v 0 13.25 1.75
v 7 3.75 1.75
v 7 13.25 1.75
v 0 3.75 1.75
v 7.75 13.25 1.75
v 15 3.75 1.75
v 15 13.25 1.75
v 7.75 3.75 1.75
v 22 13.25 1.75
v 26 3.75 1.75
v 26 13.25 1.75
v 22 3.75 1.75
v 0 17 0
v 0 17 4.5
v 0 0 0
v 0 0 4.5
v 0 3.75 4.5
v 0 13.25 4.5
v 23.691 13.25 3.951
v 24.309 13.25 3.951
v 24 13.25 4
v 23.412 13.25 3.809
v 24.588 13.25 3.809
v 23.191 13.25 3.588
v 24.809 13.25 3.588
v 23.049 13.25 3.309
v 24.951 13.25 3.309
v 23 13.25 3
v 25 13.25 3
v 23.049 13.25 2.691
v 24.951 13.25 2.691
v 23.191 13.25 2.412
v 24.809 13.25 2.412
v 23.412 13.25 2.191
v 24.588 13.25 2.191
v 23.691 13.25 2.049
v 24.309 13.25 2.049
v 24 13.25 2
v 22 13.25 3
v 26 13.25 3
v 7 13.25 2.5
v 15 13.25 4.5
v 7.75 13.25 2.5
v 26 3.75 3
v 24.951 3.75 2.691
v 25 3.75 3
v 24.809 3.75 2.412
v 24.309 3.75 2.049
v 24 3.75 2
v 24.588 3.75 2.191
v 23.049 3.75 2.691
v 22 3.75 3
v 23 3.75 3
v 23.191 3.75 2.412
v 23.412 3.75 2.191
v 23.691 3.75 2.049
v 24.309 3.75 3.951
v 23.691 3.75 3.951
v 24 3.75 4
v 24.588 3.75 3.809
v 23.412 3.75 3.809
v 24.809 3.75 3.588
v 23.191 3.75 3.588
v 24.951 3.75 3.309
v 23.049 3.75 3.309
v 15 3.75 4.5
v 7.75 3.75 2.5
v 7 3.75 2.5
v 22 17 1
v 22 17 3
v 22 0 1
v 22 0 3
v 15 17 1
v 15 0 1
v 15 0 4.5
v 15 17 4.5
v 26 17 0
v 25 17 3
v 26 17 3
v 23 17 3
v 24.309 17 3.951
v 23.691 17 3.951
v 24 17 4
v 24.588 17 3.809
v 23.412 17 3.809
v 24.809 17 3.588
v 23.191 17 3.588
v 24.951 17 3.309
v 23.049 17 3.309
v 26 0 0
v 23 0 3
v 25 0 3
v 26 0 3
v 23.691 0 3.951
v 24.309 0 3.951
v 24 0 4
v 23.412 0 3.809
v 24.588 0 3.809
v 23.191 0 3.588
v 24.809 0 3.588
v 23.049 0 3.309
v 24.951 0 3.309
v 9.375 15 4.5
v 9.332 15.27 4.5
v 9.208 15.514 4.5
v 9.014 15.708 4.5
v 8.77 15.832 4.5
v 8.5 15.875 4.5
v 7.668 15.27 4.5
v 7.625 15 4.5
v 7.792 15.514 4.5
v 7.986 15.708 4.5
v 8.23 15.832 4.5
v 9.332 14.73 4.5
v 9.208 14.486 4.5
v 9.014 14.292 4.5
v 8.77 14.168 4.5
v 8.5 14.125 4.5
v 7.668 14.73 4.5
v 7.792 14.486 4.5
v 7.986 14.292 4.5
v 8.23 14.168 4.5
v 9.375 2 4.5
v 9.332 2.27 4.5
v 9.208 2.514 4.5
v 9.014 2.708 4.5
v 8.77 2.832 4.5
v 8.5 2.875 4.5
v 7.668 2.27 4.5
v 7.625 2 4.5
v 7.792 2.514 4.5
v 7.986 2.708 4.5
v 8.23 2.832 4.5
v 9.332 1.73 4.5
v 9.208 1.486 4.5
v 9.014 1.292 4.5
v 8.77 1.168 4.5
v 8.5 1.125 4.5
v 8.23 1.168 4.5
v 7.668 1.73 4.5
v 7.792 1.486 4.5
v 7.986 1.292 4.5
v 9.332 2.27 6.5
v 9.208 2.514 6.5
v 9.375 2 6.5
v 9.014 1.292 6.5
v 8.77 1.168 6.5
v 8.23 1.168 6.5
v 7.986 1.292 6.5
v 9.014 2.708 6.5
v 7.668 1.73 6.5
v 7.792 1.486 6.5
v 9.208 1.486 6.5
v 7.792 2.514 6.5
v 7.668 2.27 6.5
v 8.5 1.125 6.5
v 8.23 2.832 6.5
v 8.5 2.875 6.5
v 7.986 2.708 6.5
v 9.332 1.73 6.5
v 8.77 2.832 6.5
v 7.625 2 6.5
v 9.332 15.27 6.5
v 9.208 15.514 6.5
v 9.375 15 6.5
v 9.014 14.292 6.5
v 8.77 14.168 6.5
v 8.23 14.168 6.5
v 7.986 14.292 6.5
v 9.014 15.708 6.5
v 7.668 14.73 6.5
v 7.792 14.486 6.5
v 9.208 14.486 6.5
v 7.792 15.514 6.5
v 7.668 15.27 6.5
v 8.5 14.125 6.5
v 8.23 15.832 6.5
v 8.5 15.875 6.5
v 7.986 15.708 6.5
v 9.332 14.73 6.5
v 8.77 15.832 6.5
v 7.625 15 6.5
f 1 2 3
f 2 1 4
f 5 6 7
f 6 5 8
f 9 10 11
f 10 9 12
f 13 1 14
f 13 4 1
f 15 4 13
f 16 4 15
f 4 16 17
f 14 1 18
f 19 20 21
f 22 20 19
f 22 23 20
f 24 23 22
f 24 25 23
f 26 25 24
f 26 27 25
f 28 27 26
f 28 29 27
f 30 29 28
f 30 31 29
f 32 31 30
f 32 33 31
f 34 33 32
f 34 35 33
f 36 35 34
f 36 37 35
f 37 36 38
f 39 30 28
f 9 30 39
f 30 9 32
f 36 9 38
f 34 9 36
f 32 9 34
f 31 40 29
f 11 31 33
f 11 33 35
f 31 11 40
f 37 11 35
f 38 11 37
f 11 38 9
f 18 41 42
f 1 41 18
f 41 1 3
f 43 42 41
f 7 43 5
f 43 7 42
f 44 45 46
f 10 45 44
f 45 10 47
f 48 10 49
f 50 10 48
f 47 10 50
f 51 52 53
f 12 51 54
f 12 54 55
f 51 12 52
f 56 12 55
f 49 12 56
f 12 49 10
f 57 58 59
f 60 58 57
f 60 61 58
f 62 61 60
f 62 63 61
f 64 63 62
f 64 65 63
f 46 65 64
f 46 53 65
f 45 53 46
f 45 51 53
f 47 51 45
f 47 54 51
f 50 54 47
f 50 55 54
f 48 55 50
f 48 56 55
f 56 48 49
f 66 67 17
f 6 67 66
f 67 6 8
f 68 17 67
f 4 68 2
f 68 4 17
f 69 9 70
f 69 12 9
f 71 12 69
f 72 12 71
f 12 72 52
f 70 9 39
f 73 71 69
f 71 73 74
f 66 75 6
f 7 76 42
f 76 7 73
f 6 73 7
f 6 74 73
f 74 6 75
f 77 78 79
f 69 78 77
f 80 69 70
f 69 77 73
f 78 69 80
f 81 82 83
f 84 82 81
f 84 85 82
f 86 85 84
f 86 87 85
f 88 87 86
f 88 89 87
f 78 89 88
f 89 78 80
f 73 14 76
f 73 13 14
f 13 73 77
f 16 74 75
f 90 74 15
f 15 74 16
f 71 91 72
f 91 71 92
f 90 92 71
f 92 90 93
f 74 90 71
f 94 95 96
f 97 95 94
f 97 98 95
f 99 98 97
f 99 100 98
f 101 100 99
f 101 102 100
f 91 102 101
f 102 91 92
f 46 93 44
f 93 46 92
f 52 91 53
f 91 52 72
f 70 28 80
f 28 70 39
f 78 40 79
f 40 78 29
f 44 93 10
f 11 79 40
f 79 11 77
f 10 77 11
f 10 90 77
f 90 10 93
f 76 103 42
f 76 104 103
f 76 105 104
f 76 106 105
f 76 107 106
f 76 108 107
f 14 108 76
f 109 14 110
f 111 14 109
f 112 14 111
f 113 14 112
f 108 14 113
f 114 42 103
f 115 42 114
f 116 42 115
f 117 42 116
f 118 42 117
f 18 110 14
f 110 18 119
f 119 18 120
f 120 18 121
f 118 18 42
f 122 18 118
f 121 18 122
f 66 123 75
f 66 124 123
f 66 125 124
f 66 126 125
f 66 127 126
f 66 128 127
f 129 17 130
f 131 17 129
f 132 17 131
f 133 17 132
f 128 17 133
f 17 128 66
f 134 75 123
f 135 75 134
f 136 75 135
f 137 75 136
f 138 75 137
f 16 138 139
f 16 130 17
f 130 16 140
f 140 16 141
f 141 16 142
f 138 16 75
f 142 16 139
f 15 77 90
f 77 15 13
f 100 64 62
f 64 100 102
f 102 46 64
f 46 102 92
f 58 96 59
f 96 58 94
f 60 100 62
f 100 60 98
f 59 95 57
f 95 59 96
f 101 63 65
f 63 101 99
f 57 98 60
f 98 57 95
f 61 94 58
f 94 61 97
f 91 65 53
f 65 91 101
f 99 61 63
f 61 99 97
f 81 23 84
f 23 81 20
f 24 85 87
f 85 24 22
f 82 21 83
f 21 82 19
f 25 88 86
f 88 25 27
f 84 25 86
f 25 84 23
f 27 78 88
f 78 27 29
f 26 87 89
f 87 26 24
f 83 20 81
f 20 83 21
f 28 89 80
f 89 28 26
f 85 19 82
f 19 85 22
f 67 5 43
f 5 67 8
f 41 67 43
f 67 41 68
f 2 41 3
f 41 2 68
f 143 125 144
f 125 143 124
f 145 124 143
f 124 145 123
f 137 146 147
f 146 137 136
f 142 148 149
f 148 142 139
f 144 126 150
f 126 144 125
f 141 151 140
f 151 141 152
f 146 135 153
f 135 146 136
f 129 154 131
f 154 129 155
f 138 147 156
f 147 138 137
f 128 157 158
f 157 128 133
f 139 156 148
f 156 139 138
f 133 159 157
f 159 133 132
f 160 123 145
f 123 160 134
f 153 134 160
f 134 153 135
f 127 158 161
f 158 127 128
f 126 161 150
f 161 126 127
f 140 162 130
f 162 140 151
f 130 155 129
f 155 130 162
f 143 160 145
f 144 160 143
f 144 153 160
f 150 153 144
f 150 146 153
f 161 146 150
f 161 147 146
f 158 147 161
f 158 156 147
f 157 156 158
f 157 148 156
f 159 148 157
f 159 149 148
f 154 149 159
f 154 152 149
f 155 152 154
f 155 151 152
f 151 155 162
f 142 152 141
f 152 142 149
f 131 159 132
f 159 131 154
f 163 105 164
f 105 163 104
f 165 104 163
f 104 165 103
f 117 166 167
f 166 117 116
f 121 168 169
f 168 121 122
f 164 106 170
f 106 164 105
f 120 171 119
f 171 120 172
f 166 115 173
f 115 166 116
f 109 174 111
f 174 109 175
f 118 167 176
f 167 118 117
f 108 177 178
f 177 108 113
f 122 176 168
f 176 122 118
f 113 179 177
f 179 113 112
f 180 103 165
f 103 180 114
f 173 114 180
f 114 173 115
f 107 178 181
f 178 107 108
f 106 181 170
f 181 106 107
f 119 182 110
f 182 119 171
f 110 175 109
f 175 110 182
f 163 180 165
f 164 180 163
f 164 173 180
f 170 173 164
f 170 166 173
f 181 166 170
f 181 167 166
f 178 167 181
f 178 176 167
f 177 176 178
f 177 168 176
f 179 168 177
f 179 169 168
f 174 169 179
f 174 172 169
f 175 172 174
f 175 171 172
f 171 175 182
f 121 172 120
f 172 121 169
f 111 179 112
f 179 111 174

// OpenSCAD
// In order to fit the backband, this piece needs to be cylindrically
// deformed before printing.
// I do this in MeshLab using
//  Filters->Smoothing, Fairing and Deformation->Geometric Function
// and then entering in z+sqrt(80^2-(x-35)^2)-80 for the z function

union() {
        difference() {
            cube([26,17,4.5]);
            union() {
                //strap track
                translate([0,3.75,1.75]) cube([48,9.5,3]);
                
                //flex gap
                translate([15,0,1]) cube([7,17,4]);
                
                //flap flexer base
                translate([22,0,3]) cube([7,17,2]);
            }   
        }
        
        //flap flexers
        translate([24,3.75,3]) rotate([90,0,0]) cylinder(r=1, h=3.75,$fn = 20);
        translate([24,13.25,3]) rotate([-90,0,0]) cylinder(r=1, h=3.75,$fn = 20);
        
        //stopper
        translate([7,0,1.75]) cube([0.75,17,0.75]);
        
        //mounting posts
        translate([8.5,2,0]) {
            cylinder(r=0.875,h=6.5,$fn=20);
        }
        translate([8.5,15,0]) {
            cylinder(r=0.875,h=6.5,$fn=20);
        }
}
